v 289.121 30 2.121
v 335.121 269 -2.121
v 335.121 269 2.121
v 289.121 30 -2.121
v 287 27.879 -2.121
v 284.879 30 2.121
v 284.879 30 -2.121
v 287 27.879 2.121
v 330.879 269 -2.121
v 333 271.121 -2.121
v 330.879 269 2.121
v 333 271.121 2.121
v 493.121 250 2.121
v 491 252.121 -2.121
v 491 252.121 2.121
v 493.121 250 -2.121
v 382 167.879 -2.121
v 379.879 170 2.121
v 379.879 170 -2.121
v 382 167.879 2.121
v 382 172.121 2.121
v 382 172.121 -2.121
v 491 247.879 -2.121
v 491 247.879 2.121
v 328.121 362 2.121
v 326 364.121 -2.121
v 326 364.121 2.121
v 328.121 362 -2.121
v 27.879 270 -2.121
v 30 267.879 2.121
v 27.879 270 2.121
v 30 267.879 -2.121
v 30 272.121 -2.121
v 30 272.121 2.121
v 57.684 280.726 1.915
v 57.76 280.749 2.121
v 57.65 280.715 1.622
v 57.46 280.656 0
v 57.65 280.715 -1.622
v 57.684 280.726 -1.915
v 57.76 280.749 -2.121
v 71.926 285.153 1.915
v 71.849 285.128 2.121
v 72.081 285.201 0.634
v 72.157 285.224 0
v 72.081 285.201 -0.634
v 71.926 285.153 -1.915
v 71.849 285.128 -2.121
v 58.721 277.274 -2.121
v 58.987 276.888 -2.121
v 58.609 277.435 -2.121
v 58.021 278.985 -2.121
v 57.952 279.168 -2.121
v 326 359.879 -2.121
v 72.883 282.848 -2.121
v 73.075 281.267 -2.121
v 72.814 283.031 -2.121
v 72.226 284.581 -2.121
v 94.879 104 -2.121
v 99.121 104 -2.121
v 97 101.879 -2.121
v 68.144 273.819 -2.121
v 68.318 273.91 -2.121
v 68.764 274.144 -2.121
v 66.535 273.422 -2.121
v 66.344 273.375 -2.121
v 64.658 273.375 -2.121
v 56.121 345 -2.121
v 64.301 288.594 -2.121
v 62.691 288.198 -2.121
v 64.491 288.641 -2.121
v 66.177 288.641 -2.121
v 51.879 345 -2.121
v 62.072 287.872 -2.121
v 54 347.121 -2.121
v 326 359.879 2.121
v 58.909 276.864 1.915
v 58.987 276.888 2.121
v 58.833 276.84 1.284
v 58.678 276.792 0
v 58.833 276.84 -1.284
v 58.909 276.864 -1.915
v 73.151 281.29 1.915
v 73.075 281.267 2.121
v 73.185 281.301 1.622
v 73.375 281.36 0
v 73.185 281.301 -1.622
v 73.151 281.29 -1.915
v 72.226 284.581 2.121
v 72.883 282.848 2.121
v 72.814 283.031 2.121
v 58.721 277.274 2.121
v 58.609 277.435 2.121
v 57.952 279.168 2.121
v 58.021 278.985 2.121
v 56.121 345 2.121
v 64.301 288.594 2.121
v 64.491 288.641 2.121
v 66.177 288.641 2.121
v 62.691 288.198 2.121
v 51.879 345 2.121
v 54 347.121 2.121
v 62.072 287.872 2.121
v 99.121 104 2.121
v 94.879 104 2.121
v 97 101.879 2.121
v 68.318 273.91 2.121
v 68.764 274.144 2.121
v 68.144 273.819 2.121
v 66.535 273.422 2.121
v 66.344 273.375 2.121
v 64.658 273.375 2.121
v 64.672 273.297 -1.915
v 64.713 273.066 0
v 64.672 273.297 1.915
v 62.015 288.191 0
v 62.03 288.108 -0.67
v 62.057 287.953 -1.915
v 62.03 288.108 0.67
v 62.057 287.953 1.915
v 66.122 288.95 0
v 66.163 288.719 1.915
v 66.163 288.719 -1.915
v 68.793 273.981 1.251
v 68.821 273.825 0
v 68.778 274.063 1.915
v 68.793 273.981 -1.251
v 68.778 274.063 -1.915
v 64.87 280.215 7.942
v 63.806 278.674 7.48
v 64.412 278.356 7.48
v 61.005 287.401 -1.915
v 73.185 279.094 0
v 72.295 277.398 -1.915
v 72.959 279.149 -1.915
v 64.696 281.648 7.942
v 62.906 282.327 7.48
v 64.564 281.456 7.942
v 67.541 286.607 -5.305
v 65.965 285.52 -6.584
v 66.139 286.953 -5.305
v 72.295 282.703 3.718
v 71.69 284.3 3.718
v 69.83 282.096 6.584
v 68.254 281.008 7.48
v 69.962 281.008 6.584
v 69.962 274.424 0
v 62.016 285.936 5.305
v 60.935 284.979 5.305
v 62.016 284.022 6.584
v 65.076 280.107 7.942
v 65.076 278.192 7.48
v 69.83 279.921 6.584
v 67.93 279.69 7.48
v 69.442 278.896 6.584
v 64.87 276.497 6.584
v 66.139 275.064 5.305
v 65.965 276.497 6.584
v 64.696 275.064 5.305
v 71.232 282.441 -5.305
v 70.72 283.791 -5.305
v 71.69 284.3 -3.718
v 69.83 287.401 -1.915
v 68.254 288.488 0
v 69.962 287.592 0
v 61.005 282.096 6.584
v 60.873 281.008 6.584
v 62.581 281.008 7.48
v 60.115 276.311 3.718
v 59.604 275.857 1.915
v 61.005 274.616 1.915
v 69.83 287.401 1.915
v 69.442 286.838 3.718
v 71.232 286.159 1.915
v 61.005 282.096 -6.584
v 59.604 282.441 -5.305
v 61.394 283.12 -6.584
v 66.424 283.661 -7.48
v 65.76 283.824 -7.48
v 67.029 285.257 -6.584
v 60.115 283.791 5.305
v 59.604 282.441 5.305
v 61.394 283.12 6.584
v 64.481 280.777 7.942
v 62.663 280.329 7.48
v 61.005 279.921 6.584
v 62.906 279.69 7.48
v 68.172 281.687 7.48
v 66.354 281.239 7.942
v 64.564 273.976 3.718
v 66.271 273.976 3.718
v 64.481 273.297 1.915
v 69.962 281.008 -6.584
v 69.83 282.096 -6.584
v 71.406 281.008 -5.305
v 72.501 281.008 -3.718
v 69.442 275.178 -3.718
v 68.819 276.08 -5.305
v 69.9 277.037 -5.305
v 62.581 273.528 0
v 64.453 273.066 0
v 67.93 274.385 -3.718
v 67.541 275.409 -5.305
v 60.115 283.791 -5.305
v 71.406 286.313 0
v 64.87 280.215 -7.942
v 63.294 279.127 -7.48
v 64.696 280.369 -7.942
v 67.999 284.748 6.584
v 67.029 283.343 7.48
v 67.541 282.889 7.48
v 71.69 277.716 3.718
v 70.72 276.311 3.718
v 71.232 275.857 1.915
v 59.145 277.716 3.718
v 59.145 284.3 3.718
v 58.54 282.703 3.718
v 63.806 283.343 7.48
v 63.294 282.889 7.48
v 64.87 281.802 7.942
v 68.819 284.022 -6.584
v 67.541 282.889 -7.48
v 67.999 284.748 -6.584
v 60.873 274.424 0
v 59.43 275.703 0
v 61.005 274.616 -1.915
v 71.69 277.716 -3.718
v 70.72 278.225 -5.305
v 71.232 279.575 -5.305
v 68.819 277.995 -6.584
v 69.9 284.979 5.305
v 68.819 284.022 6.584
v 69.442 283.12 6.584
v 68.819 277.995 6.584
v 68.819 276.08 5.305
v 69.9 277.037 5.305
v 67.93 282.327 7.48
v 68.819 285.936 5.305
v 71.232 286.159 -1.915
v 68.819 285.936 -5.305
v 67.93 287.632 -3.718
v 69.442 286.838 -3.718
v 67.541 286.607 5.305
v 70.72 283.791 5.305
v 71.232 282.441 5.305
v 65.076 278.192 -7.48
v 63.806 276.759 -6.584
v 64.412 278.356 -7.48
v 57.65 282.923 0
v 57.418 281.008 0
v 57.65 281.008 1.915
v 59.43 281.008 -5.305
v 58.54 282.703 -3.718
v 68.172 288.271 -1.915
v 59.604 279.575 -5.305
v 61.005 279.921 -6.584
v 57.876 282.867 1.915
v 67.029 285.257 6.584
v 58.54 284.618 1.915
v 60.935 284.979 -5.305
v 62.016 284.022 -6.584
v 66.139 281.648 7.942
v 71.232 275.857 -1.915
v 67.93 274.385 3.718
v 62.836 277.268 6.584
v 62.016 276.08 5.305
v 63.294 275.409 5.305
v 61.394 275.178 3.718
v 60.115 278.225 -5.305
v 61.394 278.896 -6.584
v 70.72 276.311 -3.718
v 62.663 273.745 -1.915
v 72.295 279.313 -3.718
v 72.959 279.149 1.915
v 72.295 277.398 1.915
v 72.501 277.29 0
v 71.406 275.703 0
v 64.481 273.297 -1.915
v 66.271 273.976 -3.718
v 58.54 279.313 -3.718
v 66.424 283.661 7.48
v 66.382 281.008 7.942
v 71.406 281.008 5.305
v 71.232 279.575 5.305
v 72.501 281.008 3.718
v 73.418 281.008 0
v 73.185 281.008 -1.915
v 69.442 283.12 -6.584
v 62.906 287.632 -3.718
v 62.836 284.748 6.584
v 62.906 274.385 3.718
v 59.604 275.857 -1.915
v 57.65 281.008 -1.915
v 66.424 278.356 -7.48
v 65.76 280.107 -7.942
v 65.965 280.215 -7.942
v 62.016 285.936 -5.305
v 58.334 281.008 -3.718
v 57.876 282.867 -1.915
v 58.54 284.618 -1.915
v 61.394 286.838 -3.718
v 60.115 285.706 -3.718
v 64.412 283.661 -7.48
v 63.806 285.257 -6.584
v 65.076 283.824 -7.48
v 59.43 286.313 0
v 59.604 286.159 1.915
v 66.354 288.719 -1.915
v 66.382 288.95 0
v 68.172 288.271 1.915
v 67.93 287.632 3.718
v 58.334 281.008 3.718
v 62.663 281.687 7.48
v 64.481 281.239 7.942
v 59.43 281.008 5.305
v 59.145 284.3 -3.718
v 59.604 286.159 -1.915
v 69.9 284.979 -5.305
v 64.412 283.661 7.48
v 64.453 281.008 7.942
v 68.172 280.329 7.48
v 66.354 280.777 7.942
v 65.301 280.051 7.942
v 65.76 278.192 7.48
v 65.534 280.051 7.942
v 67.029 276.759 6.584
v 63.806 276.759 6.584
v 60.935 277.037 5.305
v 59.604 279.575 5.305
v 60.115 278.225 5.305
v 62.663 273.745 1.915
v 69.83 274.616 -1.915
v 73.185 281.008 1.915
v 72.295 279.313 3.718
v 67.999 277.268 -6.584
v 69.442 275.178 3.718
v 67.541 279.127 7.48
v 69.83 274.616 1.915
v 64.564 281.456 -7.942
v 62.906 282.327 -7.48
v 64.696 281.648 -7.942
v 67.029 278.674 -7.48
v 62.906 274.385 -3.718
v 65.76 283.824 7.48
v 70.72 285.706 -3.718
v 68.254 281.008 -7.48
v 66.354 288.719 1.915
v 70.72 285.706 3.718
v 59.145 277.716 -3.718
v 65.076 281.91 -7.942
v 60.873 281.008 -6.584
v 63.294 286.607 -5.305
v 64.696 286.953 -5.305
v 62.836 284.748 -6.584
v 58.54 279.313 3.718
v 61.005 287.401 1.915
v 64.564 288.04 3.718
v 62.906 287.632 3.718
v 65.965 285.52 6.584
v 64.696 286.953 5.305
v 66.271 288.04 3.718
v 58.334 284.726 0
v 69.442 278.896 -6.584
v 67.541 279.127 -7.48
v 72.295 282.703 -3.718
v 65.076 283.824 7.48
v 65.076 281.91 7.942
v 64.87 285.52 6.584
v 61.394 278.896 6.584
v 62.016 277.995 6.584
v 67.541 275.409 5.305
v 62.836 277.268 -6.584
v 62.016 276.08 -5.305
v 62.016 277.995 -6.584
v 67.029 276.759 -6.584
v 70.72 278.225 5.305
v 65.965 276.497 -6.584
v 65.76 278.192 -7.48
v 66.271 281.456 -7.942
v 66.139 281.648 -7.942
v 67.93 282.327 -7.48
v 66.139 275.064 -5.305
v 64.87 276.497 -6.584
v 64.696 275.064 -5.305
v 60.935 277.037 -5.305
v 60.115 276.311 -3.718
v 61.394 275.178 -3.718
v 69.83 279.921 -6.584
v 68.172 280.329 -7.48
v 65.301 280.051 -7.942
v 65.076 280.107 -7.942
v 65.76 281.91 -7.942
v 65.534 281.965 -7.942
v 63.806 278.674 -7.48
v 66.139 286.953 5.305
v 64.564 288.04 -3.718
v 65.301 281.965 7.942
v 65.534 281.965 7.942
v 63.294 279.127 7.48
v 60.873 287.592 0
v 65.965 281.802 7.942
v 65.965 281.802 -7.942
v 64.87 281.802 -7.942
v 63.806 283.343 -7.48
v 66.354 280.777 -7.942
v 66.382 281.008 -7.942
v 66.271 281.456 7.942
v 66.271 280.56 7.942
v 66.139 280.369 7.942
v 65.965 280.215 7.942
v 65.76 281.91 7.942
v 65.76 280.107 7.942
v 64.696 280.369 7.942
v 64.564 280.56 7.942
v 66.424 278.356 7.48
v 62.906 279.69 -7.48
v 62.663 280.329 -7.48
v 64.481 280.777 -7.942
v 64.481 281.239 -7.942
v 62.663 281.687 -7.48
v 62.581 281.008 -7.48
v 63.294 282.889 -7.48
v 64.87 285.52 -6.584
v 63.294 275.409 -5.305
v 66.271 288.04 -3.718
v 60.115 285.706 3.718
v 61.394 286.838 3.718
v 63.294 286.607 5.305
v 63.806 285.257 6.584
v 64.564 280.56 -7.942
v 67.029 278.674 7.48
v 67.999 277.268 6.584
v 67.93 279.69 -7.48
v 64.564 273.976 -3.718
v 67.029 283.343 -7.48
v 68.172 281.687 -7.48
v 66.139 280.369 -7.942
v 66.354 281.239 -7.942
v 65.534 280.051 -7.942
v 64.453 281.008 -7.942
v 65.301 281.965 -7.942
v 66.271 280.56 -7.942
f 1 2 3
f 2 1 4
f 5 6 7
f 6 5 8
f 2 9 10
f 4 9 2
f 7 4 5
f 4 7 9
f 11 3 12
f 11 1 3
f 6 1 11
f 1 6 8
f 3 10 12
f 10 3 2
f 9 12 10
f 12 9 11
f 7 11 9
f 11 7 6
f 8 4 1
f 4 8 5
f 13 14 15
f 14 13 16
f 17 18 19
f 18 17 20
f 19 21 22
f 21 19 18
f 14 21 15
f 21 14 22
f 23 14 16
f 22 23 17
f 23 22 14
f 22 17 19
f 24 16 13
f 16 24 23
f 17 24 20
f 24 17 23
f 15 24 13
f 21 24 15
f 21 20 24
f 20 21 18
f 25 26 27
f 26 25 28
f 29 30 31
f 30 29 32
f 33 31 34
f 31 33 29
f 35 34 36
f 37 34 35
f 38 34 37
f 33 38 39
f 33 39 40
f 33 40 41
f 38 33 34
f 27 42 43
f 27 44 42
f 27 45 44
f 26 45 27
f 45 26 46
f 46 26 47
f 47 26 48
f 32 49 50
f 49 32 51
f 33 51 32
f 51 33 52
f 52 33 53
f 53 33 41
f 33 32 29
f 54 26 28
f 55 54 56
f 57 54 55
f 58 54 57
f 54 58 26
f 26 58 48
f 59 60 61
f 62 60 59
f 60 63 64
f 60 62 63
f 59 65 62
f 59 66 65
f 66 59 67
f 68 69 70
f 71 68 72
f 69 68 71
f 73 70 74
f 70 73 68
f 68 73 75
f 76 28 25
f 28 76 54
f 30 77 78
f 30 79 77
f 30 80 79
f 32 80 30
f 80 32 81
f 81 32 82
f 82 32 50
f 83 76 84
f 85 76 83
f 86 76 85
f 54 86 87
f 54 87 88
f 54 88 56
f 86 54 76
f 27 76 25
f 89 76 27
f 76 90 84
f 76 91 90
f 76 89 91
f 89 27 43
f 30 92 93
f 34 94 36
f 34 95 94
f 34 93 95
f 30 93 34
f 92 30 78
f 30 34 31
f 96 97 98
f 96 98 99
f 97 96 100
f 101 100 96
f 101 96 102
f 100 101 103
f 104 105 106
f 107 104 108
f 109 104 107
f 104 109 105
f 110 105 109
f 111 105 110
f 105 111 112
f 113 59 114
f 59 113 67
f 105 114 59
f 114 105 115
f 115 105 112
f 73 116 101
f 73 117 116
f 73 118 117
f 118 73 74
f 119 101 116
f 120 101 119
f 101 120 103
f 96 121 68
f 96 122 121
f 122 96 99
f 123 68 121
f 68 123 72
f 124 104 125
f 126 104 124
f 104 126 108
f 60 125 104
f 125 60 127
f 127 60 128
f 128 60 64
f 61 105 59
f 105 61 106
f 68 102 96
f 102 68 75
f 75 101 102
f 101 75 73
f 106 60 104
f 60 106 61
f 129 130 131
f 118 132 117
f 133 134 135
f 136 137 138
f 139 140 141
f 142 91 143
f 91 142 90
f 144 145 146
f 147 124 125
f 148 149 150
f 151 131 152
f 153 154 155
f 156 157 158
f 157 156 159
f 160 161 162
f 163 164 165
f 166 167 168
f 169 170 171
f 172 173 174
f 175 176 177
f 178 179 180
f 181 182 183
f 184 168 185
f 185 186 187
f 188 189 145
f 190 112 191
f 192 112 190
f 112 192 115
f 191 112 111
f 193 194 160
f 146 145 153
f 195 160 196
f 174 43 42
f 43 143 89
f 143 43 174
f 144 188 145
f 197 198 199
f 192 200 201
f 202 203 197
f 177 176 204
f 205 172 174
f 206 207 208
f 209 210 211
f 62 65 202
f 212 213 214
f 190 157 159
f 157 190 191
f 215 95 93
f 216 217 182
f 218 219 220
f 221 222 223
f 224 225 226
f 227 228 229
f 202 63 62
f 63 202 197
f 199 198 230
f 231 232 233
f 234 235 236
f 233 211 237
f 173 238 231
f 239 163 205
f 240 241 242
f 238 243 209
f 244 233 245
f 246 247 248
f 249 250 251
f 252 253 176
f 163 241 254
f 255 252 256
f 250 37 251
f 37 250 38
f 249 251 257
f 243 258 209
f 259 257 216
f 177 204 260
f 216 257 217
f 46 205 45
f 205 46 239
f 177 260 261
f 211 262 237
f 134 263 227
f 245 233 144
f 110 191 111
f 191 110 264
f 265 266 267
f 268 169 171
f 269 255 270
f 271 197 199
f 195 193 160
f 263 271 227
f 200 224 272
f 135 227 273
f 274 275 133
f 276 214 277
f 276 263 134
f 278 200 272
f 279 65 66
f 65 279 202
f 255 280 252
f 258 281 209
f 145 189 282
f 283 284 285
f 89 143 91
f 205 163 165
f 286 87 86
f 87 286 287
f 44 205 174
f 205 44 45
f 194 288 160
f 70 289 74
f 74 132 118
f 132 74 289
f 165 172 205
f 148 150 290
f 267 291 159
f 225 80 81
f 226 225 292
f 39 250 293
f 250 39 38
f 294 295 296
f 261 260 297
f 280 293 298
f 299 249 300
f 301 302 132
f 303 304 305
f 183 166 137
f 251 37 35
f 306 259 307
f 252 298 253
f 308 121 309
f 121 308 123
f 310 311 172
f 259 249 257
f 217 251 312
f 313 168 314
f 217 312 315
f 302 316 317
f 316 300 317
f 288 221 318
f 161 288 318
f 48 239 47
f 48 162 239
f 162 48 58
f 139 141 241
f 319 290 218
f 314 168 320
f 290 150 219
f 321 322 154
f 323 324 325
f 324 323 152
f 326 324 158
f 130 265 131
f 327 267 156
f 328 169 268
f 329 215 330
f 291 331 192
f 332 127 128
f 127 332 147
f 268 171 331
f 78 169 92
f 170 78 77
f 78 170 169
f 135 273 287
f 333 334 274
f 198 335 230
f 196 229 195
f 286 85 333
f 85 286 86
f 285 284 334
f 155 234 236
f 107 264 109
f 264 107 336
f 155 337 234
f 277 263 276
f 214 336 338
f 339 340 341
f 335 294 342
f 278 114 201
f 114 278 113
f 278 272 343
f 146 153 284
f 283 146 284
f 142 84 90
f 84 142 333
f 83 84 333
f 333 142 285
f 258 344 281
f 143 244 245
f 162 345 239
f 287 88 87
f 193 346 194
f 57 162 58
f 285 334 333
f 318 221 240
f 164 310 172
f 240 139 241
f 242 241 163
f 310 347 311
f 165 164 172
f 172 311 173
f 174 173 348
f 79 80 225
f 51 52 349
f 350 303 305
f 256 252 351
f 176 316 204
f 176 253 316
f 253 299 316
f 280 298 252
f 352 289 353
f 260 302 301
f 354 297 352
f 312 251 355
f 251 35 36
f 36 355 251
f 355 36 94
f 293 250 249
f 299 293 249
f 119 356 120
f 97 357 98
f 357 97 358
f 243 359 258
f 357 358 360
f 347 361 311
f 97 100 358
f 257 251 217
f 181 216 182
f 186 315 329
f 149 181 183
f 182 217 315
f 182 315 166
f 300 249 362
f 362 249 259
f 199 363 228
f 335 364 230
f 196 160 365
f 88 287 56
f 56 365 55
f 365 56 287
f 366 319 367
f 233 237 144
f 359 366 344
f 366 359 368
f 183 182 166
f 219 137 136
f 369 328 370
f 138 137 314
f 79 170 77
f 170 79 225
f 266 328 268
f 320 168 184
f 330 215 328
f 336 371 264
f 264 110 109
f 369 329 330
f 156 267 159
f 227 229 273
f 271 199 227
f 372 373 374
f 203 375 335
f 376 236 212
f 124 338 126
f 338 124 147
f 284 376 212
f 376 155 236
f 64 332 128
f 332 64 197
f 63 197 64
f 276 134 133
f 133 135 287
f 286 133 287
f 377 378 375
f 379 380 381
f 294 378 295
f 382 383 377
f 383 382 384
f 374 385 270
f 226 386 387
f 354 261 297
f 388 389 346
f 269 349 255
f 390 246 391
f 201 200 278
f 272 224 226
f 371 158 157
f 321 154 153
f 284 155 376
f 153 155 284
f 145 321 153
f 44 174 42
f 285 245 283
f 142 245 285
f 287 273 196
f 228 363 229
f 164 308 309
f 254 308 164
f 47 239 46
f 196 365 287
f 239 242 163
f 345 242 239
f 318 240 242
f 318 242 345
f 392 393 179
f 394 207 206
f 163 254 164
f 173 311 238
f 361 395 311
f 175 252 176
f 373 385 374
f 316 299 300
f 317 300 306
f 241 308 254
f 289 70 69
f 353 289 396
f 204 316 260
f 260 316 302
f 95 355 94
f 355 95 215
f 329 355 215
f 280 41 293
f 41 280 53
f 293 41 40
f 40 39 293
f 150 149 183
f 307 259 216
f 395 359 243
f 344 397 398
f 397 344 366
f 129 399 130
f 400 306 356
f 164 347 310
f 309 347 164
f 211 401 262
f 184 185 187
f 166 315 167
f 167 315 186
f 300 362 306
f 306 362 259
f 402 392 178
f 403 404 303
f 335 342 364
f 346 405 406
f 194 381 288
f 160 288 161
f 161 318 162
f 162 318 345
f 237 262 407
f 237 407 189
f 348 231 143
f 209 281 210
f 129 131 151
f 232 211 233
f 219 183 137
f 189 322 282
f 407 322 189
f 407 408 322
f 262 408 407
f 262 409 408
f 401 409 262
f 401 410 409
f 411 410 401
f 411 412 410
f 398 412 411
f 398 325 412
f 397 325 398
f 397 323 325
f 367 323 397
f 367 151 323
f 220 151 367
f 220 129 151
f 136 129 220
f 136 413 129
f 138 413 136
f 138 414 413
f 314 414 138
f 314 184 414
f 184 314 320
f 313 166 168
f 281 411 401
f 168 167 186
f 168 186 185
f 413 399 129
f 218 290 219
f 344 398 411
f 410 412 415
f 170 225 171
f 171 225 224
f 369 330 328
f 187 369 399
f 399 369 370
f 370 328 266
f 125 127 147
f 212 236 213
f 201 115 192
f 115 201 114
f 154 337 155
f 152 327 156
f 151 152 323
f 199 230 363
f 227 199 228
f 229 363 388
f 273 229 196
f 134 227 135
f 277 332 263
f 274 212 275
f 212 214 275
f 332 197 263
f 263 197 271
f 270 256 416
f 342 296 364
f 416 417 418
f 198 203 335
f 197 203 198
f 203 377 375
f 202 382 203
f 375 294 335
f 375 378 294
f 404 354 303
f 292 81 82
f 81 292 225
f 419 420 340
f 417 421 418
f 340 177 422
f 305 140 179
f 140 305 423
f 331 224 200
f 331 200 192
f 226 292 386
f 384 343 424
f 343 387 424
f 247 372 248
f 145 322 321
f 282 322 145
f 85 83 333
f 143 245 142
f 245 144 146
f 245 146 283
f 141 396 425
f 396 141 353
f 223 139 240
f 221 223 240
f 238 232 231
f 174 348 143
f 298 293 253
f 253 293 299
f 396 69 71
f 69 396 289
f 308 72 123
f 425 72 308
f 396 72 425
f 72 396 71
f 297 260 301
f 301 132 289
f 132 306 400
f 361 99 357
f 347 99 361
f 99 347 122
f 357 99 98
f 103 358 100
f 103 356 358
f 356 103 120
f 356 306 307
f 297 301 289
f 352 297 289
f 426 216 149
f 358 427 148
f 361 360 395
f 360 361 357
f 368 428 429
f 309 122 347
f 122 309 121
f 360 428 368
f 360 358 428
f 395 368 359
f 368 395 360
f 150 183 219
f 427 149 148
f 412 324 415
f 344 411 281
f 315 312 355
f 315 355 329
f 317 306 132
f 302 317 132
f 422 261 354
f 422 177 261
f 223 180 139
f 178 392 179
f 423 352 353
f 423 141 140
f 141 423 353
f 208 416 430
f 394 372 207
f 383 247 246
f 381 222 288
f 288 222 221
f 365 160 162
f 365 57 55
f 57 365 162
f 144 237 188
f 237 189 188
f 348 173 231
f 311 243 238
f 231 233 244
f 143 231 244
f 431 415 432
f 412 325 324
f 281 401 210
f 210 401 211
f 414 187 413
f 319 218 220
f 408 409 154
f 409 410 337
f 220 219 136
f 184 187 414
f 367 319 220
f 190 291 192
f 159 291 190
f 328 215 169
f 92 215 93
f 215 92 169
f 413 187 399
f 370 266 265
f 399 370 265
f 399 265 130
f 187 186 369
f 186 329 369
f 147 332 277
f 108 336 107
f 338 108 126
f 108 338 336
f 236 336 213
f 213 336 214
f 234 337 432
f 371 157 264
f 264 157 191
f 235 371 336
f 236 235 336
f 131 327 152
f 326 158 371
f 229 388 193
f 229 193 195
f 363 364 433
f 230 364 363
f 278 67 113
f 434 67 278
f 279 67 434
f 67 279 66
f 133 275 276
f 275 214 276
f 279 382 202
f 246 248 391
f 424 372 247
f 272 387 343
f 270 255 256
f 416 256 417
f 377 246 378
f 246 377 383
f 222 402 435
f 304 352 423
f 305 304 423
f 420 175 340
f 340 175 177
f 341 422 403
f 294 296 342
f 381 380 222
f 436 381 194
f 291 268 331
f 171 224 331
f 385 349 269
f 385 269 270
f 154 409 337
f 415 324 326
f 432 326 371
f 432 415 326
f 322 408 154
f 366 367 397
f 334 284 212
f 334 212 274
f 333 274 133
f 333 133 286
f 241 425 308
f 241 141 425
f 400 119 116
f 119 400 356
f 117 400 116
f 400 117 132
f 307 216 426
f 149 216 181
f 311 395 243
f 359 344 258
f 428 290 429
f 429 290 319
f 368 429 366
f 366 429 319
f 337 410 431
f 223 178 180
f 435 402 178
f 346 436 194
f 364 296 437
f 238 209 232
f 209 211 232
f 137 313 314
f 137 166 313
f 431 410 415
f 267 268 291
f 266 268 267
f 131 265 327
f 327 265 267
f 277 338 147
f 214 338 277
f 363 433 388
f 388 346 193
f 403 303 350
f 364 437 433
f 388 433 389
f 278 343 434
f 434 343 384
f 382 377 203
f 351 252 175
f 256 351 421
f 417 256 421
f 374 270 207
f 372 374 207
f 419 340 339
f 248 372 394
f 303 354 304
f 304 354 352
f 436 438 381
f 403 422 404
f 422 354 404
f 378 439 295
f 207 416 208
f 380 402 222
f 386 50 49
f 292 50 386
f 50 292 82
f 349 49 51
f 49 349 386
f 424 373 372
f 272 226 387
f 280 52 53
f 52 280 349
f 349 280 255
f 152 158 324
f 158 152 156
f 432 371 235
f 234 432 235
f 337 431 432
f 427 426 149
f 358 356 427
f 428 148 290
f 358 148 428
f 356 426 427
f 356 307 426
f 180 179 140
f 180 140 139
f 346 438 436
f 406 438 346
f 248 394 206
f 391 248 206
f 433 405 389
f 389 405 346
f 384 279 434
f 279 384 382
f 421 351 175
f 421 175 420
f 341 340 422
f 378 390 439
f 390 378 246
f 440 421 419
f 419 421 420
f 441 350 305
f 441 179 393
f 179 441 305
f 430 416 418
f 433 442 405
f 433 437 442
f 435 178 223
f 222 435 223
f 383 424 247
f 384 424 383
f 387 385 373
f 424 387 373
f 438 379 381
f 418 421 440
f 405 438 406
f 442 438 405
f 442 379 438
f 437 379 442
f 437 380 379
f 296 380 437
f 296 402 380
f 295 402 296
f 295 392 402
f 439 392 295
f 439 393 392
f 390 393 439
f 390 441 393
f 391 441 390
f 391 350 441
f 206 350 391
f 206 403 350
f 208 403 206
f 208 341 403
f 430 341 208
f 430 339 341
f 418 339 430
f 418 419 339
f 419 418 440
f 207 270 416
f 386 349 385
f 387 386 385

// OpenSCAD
upper=0;
lower=1;
inter=2;
function rnd_v(init_value,end_value)=round(rands(start_value,end_value,1)[0]);
start_value=0;
end_value=500;
segments_num=4; 
segments=[
     for(i=[0:segments_num-1])
           [point(start_value,end_value),
           point(start_value,end_value)]
];
function point(start_value,end_value)=  
    [rnd_v(start_value,end_value),
     rnd_v(start_value,end_value)];
thickness=6;

for(i=segments)
    draw_line(i[0],i[1],thickness,4);

module draw_line(p1,p2,thickness,fn=4){
    $fn=fn;    
    hull(){
        translate(p1)sphere(thickness/2);
        translate(p2)sphere(thickness/2);
        } }
//sort by y
function compare(p1,p2)=
       p1.y>p2.y || (p1.y==p2.y && p1.x<p2.x)?
       true:false;  
function quick_sort(points)=
         let(leng=len(points)-1)
         leng<1?points:
         let(pivot=points[0])
         let(before=[for (i=[1:leng])
             if(compare(point_of_array(points[i]),
                        point_of_array(pivot)))
                 points[i]])
         let(after=[for(i=[1:leng])
             if(compare(point_of_array(points[i]),
                        point_of_array(pivot))==false)
                 points[i]])
         [each quick_sort(before),pivot,each quick_sort(after)];                 
function point_of_array(array)=array[0];//[x,y]
function section_of_array(array)=array[1];// upper or lower or inter         
function segment_of_array(array)=array[2];//[[upper_p],[lower_p]]             
             
function upper_of_segment(segment)=segment[0];
function lower_of_segment(segment)=segment[1];
            
//output[[point],upper or lower,segment]            
function event_array(segments)=
        let(leng=len(segments)-1)
        let(uppers=[for(i=[0:leng])
                    (segments[i][0].y>segments[i][1].y) || 
                    (segments[i][0].y==segments[i][1].y && segments[i][0].x<segments[i][1].x) ?
                   [segments[i][0],upper,[segments[i][0],segments[i][1]]]:
                   [segments[i][1],upper,[segments[i][1],segments[i][0]]]
                   ])
        let(lowers=[for(i=[0:leng])
                   (segments[i][0].y>segments[i][1].y) ||
                    (segments[i][0].y==segments[i][1].y && segments[i][0].x<segments[i][1].x)?
                   [segments[i][1],lower,[segments[i][0],segments[i][1]]]:
                   [segments[i][0],lower,[segments[i][1],segments[i][0]]]
                   ])
        quick_sort( [each uppers,each lowers]);
                                        
function dot(v1,v2)=
    v1.x*v2.x+v1.y*v2.y;                        
function cross_(v1,v2)=
    v1.x*v2.y-v1.y*v2.x;             
function dequeue(queue)=
        let(leng=len(queue)-1)
        leng<=0?
        []:
        [for(i=[1:leng])
        queue[i]];    
function inqueue(queue,num)=
       [for(i=queue)i ,num] ;        
function pop(array)=
      len(array)<2?
      []:  
      let(leng=len(array)-2)
      [for(i=[0:leng])
      array[i]   
      ];
function push(array,num)=
      [num,for(i=array) i];
          
function insert_tree(tree,segment)=
     let(leng=len(tree)-1)
     let(right=[])
     insert_tree_inner(tree,segment,leng,right);
 function insert_tree_inner(tree,segment,leng,right)=
     leng<0 && len(right)-1<0?[[segment],[]]:
      leng<0? [[segment,each right],[right[0]]]:
     cross_(lower_of_segment(tree[leng])-upper_of_segment(tree[leng]),
      (upper_of_segment(segment)-upper_of_segment(tree[leng])))<0?   
     let(tree_=pop(tree)) 
     let(right_=push(right,tree[leng]))       
     insert_tree_inner(tree_,segment,leng-1,right_):
      len(right)-1<0?
     [[each tree, segment, each right],[tree[leng]]]:
     [[each tree, segment, each right],[ tree[leng], right[0]]] ;


function extract_tree(tree,segment)=
      let(leng=len(tree)-1)
      let(right=[])
      extract_tree_inner(tree,segment,leng,right);
function extract_tree_inner(tree,segment,leng,right)=
      leng<0?[[],["lower_extract_tree_error"]]:
      tree[leng]==segment?
      let(tree_=pop(tree))
      let(leng_tree_=len(tree_)-1)
      let(leng_right=len(right)-1)
      leng_tree_<0 && leng_right<0?
      [[],[]]:
      leng_right<0?
      [[each tree_],[]]:
      leng_tree_<0?
      [[each right],[]]:
      //leng_tree_>=0 && len_right>=0
      [[each tree_,each right],[tree_[leng_tree_],right[0]]]:
      
      let(tree_=pop(tree))
      let(right_=push(right,tree[leng]))
      extract_tree_inner(tree_,segment,leng-1,right_);
       


function swap_tree(tree,segment_set)=
         let(leng=len(tree)-1)
         let(right=[])
         swap_tree_inner(tree,segment_set,leng,right);
function swap_tree_inner(tree,segment_set,leng,right)=
         leng<0?[[],["swap_tree_error"]]:
         (tree[leng]==segment_set[1] && tree[leng-1]==segment_set[0])
         ||
         (tree[leng]==segment_set[0] && tree[leng-1]==segment_set[1])?
         let(leng_tree=len(tree)-1)
         leng_tree<2?
         let(leng_right=len(right)-1)
         let(tree_=[tree[1],tree[0],each right])
         leng_right>=0?
         [tree_,[[tree[leng-1],right[0]]]]:
         [tree_,[]]
         :
         //leng_tree>=2
         let(tree_=[for(i=[0:leng-2])
             tree[i],tree[leng],tree[leng-1],each right])
         let(leng_right=len(right)-1)
         leng_right>=0?
         [tree_,[[tree[leng],tree[leng-2]],[tree[leng-1],right[0]]]]:
         [tree_,[[tree[leng],tree[leng-2]]]]     
         :
         let(tree_=pop(tree))
         let(right_=push(right,tree[leng]))
         swap_tree_inner(tree_,segment_set,leng-1,right_);
 
         
tree=[[[14, 90], [58, 66]], [[28, 92], [83, 76]], [[68, 83], [31, 18]]];
segment_set= [[[68, 83], [31, 18]], [[28, 92], [83, 76]]];
test_swap=swap_tree(tree,segment_set);
 echo(test_swap);        




function get_tree(tree_array)=[tree_array[0]];
function get_sibling(tree_array)=[tree_array[1]];         


//Put the intercetion point into queue. sort by y
function push_event(event_array,new_event)=
      let(new_event_point=point_of_array(new_event))
      let(upper=[])
      push_event_inner(event_array,new_event,new_event_point,upper);
function push_event_inner(event_array,new_event,new_event_point,upper)=     
      let(event_leng=len(event_array)-1)
      event_leng<0?[each event_array,new_event]:
      let(event_point=point_of_array(event_array[0]))
      new_event_point.y<event_point.y?
      let(event_array_=dequeue(event_array))
      let(upper_=inqueue(upper,event_array[0]))
      push_event_inner(event_array_,new_event,new_event_point,upper_):
      //new_event_point.y>point_of_segment(event_point[index])
      [each upper,new_event,each event_array];


function push_event_points(event_array,new_events)=
    let(leng=len(new_events)-1)
    push_event_points_inner(event_array,new_events,leng);
function push_event_points_inner(event_array,new_events,leng)=
    leng<0? event_array:
    let(event_array_=push_event(event_array,new_events[leng]))
    push_event_points_inner(event_array_,new_events,leng-1); 



//Determine whether two line segments intersect.
function seg_inters_compare(line_a,line_b)=
    cross_(line_b[1]-line_b[0],line_a[1]-line_b[0])>=0 &&
    cross_(line_b[1]-line_b[0],line_a[0]-line_b[0])<=0 ||
    cross_(line_b[1]-line_b[0],line_a[1]-line_b[0])<=0 &&
    cross_(line_b[1]-line_b[0],line_a[0]-line_b[0])>=0 ?   
    (cross_(line_a[0]-line_b[1],line_a[1]-line_b[1])>0 &&
    cross_(line_a[0]-line_b[0],line_a[1]-line_b[0])<0) ||
    (cross_(line_a[0]-line_b[1],line_a[1]-line_b[1])<0 &&
    cross_(line_a[0]-line_b[0],line_a[1]-line_b[0])>0)? 
    true:    
    false:false;

 //Find the two segment intercetion point
function intersection_point(segment_a,segment_b)=
    let(base_a=segment_a[1]-segment_a[0])
    let(side_ab=[segment_b[0].x-segment_a[0].x,segment_b[0].y-segment_a[0].y])
    let(side_b=segment_b[1]-segment_b[0])
    let(area_a=abs(cross_(base_a,side_ab)))
    let(area_b=abs(cross_(base_a,side_b))-area_a)
    let(x=(area_a*segment_b[1].x+area_b*segment_b[0].x)/(area_a+area_b))
    let(y=(area_a*segment_b[1].y+area_b*segment_b[0].y)/(area_a+area_b))
    [x,y];   

function intersection_with_sibling(event_segment,sibling)=
    let(leng=len(sibling)-1)
    let(inter_p=[])
    intersection_with_sibling_inner(event_segment,sibling,leng,inter_p);
function intersection_with_sibling_inner(event_segment,sibling,leng,inter_p)=
    leng<0? inter_p:
    seg_inters_compare(event_segment,sibling[leng])==true?
    let(inter_point=intersection_point(event_segment,sibling[leng]))
    let(inter_array= //leng==1?
                     [inter_point,inter,[event_segment,sibling[leng]]]
                     //:
                     //leng==0
                     //[inter_point,inter,[sibling[leng]]]
                     )
    let(inter_p_=push(inter_p,inter_array))
    intersection_with_sibling_inner(event_segment,sibling,leng-1,inter_p_):
    //seg_inters_compare(event_segment,sibling[leng])==false. Two segment aren't intersection 
    intersection_with_sibling_inner(event_segment,sibling,leng-1,inter_p);




function segments_intersection(event_points,test_count)=
      let(segment=segment_of_array(event_points[0]))
      let(tree=[segment])         
      let(inters=[])
      let(event_points_=dequeue(event_points))
      segments_intersection_inner(tree,inters,event_points_,test_count);

function segments_intersection_inner(tree,inters,event_points,test_count)=
      test_count<0? inters:
      len(event_points)-1<0? inters:      
      let(section=section_of_array(event_points[0]))
//--------------------------------------------------------------------------------      
      echo("tree",tree)
      echo("inters",inters)
      //echo("event_points",event_points)
      section==upper?  //First,determine what type the new event point is.       
      let(event_segment=segment_of_array(event_points[0]))  //which segment
      //push segment into new_tree. [[segments],[sibling]]
      let(new_tree=insert_tree(tree,event_segment))  
      let(tree_=get_tree(new_tree)[0])
      echo("upper_new_tree",tree_)
      let(sibling=get_sibling(new_tree)[0])
      echo("upper_sibilng",sibling)
      let(event_points_=dequeue(event_points))
 
      len(sibling)-1<0?
      segments_intersection_inner(tree_,inters,event_points_,test_count-1): 
 
 
    //find the intersection with sibling
      let(intersection_p=intersection_with_sibling(event_segment,sibling))
      echo("upper_intersection_p",intersection_p)
      len(intersection_p)-1<0?
      segments_intersection_inner(tree_,inters,event_points_,test_count-1):
      //len(intersection_p)>=0
      
      let(inter_points=[for(i=intersection_p) point_of_array(i)])
      let(inters_=concat(inters,inter_points))
      echo("upper_inters_",inters_)
      let(event_points_with_inter=push_event_points(event_points_,intersection_p))
      segments_intersection_inner(tree_,inters_,event_points_with_inter,test_count-1):
//----------------------------------------------------------------------------------          
     section==lower?
     let(event_segment=segment_of_array(event_points[0]))
     //extract segment from tree
     echo("lower_event_segment",event_segment)
     let(new_tree=extract_tree(tree,event_segment))
     let(tree_=get_tree(new_tree)[0])
     echo("lower_tree",tree_) 
     let(sibling=get_sibling(new_tree)[0])
     echo("lower_sibling",sibling)     
     let(event_points_=dequeue(event_points))
     
     len(sibling)-1<0?
     segments_intersection_inner(tree_,inters,event_points_,test_count-1): 
      
     //find the intersection with sibling
     let(intersection_p=intersection_with_sibling(sibling[0],[sibling[1]]))
     echo("lower_intersection_p",intersection_p)
     len(intersection_p)-1<0? //no intersection
     segments_intersection_inner(tree_,inters,event_points_,test_count-1):
      
     let(inter_points=[for(i=intersection_p)point_of_array(i)])
     let(inters_=concat(inters,inter_points))
     echo("lower_inters",inters_)
     let(event_points_with_inter=push_event_points(event_points_,intersection_p))
     segments_intersection_inner(tree_,inters_,event_points_with_inter,test_count-1):
     
     //------------------------------------------------------------------------------------
     
     //section==inter?
     let(segment_set=segment_of_array(event_points[0]))
     echo("inter_segment_set",segment_set)
     let(new_tree=swap_tree(tree,segment_set))
     let(tree_=get_tree(new_tree)[0])
     echo("inter_tree",tree_)
     let(sibling_set=get_sibling(new_tree)[0])
     echo("inter_sibling_set",sibling_set)
     let(event_points_=dequeue(event_points))
     
     sibling_set==[]?
     segments_intersection_inner(tree_,inters,event_points_,test_count-1):
     //---------------------------------------------------------------------------------
     let(intersection_p=[ for(i=sibling_set)
                         intersection_with_sibling(i[0],[i[1]])]) 
     echo("inter_intersection_p",intersection_p)
     
     
     intersection_p[0]==[]?
     segments_intersection_inner(tree_,inters,event_points_,test_count-1):
     let(inters_=concat(inters,[for(i=intersection_p)
                                 point_of_array(i)[0]]))
     echo("inter_inters",inters_) 
     let(event_points_with_inter=push_event_points(event_points_,intersection_p[0])) 
     segments_intersection_inner(tree_,inters_,event_points_with_inter,test_count-1);
//------------------------------------------------------------------------------------

test_count=50;
test_event_array=event_array(segments);
uuu=segments_intersection(test_event_array,test_count);
echo("intersection",uuu);
   

if(len(uuu)-1>=0)     
for(i=uuu)
translate(i)
    color("red")
    sphere(8);   
